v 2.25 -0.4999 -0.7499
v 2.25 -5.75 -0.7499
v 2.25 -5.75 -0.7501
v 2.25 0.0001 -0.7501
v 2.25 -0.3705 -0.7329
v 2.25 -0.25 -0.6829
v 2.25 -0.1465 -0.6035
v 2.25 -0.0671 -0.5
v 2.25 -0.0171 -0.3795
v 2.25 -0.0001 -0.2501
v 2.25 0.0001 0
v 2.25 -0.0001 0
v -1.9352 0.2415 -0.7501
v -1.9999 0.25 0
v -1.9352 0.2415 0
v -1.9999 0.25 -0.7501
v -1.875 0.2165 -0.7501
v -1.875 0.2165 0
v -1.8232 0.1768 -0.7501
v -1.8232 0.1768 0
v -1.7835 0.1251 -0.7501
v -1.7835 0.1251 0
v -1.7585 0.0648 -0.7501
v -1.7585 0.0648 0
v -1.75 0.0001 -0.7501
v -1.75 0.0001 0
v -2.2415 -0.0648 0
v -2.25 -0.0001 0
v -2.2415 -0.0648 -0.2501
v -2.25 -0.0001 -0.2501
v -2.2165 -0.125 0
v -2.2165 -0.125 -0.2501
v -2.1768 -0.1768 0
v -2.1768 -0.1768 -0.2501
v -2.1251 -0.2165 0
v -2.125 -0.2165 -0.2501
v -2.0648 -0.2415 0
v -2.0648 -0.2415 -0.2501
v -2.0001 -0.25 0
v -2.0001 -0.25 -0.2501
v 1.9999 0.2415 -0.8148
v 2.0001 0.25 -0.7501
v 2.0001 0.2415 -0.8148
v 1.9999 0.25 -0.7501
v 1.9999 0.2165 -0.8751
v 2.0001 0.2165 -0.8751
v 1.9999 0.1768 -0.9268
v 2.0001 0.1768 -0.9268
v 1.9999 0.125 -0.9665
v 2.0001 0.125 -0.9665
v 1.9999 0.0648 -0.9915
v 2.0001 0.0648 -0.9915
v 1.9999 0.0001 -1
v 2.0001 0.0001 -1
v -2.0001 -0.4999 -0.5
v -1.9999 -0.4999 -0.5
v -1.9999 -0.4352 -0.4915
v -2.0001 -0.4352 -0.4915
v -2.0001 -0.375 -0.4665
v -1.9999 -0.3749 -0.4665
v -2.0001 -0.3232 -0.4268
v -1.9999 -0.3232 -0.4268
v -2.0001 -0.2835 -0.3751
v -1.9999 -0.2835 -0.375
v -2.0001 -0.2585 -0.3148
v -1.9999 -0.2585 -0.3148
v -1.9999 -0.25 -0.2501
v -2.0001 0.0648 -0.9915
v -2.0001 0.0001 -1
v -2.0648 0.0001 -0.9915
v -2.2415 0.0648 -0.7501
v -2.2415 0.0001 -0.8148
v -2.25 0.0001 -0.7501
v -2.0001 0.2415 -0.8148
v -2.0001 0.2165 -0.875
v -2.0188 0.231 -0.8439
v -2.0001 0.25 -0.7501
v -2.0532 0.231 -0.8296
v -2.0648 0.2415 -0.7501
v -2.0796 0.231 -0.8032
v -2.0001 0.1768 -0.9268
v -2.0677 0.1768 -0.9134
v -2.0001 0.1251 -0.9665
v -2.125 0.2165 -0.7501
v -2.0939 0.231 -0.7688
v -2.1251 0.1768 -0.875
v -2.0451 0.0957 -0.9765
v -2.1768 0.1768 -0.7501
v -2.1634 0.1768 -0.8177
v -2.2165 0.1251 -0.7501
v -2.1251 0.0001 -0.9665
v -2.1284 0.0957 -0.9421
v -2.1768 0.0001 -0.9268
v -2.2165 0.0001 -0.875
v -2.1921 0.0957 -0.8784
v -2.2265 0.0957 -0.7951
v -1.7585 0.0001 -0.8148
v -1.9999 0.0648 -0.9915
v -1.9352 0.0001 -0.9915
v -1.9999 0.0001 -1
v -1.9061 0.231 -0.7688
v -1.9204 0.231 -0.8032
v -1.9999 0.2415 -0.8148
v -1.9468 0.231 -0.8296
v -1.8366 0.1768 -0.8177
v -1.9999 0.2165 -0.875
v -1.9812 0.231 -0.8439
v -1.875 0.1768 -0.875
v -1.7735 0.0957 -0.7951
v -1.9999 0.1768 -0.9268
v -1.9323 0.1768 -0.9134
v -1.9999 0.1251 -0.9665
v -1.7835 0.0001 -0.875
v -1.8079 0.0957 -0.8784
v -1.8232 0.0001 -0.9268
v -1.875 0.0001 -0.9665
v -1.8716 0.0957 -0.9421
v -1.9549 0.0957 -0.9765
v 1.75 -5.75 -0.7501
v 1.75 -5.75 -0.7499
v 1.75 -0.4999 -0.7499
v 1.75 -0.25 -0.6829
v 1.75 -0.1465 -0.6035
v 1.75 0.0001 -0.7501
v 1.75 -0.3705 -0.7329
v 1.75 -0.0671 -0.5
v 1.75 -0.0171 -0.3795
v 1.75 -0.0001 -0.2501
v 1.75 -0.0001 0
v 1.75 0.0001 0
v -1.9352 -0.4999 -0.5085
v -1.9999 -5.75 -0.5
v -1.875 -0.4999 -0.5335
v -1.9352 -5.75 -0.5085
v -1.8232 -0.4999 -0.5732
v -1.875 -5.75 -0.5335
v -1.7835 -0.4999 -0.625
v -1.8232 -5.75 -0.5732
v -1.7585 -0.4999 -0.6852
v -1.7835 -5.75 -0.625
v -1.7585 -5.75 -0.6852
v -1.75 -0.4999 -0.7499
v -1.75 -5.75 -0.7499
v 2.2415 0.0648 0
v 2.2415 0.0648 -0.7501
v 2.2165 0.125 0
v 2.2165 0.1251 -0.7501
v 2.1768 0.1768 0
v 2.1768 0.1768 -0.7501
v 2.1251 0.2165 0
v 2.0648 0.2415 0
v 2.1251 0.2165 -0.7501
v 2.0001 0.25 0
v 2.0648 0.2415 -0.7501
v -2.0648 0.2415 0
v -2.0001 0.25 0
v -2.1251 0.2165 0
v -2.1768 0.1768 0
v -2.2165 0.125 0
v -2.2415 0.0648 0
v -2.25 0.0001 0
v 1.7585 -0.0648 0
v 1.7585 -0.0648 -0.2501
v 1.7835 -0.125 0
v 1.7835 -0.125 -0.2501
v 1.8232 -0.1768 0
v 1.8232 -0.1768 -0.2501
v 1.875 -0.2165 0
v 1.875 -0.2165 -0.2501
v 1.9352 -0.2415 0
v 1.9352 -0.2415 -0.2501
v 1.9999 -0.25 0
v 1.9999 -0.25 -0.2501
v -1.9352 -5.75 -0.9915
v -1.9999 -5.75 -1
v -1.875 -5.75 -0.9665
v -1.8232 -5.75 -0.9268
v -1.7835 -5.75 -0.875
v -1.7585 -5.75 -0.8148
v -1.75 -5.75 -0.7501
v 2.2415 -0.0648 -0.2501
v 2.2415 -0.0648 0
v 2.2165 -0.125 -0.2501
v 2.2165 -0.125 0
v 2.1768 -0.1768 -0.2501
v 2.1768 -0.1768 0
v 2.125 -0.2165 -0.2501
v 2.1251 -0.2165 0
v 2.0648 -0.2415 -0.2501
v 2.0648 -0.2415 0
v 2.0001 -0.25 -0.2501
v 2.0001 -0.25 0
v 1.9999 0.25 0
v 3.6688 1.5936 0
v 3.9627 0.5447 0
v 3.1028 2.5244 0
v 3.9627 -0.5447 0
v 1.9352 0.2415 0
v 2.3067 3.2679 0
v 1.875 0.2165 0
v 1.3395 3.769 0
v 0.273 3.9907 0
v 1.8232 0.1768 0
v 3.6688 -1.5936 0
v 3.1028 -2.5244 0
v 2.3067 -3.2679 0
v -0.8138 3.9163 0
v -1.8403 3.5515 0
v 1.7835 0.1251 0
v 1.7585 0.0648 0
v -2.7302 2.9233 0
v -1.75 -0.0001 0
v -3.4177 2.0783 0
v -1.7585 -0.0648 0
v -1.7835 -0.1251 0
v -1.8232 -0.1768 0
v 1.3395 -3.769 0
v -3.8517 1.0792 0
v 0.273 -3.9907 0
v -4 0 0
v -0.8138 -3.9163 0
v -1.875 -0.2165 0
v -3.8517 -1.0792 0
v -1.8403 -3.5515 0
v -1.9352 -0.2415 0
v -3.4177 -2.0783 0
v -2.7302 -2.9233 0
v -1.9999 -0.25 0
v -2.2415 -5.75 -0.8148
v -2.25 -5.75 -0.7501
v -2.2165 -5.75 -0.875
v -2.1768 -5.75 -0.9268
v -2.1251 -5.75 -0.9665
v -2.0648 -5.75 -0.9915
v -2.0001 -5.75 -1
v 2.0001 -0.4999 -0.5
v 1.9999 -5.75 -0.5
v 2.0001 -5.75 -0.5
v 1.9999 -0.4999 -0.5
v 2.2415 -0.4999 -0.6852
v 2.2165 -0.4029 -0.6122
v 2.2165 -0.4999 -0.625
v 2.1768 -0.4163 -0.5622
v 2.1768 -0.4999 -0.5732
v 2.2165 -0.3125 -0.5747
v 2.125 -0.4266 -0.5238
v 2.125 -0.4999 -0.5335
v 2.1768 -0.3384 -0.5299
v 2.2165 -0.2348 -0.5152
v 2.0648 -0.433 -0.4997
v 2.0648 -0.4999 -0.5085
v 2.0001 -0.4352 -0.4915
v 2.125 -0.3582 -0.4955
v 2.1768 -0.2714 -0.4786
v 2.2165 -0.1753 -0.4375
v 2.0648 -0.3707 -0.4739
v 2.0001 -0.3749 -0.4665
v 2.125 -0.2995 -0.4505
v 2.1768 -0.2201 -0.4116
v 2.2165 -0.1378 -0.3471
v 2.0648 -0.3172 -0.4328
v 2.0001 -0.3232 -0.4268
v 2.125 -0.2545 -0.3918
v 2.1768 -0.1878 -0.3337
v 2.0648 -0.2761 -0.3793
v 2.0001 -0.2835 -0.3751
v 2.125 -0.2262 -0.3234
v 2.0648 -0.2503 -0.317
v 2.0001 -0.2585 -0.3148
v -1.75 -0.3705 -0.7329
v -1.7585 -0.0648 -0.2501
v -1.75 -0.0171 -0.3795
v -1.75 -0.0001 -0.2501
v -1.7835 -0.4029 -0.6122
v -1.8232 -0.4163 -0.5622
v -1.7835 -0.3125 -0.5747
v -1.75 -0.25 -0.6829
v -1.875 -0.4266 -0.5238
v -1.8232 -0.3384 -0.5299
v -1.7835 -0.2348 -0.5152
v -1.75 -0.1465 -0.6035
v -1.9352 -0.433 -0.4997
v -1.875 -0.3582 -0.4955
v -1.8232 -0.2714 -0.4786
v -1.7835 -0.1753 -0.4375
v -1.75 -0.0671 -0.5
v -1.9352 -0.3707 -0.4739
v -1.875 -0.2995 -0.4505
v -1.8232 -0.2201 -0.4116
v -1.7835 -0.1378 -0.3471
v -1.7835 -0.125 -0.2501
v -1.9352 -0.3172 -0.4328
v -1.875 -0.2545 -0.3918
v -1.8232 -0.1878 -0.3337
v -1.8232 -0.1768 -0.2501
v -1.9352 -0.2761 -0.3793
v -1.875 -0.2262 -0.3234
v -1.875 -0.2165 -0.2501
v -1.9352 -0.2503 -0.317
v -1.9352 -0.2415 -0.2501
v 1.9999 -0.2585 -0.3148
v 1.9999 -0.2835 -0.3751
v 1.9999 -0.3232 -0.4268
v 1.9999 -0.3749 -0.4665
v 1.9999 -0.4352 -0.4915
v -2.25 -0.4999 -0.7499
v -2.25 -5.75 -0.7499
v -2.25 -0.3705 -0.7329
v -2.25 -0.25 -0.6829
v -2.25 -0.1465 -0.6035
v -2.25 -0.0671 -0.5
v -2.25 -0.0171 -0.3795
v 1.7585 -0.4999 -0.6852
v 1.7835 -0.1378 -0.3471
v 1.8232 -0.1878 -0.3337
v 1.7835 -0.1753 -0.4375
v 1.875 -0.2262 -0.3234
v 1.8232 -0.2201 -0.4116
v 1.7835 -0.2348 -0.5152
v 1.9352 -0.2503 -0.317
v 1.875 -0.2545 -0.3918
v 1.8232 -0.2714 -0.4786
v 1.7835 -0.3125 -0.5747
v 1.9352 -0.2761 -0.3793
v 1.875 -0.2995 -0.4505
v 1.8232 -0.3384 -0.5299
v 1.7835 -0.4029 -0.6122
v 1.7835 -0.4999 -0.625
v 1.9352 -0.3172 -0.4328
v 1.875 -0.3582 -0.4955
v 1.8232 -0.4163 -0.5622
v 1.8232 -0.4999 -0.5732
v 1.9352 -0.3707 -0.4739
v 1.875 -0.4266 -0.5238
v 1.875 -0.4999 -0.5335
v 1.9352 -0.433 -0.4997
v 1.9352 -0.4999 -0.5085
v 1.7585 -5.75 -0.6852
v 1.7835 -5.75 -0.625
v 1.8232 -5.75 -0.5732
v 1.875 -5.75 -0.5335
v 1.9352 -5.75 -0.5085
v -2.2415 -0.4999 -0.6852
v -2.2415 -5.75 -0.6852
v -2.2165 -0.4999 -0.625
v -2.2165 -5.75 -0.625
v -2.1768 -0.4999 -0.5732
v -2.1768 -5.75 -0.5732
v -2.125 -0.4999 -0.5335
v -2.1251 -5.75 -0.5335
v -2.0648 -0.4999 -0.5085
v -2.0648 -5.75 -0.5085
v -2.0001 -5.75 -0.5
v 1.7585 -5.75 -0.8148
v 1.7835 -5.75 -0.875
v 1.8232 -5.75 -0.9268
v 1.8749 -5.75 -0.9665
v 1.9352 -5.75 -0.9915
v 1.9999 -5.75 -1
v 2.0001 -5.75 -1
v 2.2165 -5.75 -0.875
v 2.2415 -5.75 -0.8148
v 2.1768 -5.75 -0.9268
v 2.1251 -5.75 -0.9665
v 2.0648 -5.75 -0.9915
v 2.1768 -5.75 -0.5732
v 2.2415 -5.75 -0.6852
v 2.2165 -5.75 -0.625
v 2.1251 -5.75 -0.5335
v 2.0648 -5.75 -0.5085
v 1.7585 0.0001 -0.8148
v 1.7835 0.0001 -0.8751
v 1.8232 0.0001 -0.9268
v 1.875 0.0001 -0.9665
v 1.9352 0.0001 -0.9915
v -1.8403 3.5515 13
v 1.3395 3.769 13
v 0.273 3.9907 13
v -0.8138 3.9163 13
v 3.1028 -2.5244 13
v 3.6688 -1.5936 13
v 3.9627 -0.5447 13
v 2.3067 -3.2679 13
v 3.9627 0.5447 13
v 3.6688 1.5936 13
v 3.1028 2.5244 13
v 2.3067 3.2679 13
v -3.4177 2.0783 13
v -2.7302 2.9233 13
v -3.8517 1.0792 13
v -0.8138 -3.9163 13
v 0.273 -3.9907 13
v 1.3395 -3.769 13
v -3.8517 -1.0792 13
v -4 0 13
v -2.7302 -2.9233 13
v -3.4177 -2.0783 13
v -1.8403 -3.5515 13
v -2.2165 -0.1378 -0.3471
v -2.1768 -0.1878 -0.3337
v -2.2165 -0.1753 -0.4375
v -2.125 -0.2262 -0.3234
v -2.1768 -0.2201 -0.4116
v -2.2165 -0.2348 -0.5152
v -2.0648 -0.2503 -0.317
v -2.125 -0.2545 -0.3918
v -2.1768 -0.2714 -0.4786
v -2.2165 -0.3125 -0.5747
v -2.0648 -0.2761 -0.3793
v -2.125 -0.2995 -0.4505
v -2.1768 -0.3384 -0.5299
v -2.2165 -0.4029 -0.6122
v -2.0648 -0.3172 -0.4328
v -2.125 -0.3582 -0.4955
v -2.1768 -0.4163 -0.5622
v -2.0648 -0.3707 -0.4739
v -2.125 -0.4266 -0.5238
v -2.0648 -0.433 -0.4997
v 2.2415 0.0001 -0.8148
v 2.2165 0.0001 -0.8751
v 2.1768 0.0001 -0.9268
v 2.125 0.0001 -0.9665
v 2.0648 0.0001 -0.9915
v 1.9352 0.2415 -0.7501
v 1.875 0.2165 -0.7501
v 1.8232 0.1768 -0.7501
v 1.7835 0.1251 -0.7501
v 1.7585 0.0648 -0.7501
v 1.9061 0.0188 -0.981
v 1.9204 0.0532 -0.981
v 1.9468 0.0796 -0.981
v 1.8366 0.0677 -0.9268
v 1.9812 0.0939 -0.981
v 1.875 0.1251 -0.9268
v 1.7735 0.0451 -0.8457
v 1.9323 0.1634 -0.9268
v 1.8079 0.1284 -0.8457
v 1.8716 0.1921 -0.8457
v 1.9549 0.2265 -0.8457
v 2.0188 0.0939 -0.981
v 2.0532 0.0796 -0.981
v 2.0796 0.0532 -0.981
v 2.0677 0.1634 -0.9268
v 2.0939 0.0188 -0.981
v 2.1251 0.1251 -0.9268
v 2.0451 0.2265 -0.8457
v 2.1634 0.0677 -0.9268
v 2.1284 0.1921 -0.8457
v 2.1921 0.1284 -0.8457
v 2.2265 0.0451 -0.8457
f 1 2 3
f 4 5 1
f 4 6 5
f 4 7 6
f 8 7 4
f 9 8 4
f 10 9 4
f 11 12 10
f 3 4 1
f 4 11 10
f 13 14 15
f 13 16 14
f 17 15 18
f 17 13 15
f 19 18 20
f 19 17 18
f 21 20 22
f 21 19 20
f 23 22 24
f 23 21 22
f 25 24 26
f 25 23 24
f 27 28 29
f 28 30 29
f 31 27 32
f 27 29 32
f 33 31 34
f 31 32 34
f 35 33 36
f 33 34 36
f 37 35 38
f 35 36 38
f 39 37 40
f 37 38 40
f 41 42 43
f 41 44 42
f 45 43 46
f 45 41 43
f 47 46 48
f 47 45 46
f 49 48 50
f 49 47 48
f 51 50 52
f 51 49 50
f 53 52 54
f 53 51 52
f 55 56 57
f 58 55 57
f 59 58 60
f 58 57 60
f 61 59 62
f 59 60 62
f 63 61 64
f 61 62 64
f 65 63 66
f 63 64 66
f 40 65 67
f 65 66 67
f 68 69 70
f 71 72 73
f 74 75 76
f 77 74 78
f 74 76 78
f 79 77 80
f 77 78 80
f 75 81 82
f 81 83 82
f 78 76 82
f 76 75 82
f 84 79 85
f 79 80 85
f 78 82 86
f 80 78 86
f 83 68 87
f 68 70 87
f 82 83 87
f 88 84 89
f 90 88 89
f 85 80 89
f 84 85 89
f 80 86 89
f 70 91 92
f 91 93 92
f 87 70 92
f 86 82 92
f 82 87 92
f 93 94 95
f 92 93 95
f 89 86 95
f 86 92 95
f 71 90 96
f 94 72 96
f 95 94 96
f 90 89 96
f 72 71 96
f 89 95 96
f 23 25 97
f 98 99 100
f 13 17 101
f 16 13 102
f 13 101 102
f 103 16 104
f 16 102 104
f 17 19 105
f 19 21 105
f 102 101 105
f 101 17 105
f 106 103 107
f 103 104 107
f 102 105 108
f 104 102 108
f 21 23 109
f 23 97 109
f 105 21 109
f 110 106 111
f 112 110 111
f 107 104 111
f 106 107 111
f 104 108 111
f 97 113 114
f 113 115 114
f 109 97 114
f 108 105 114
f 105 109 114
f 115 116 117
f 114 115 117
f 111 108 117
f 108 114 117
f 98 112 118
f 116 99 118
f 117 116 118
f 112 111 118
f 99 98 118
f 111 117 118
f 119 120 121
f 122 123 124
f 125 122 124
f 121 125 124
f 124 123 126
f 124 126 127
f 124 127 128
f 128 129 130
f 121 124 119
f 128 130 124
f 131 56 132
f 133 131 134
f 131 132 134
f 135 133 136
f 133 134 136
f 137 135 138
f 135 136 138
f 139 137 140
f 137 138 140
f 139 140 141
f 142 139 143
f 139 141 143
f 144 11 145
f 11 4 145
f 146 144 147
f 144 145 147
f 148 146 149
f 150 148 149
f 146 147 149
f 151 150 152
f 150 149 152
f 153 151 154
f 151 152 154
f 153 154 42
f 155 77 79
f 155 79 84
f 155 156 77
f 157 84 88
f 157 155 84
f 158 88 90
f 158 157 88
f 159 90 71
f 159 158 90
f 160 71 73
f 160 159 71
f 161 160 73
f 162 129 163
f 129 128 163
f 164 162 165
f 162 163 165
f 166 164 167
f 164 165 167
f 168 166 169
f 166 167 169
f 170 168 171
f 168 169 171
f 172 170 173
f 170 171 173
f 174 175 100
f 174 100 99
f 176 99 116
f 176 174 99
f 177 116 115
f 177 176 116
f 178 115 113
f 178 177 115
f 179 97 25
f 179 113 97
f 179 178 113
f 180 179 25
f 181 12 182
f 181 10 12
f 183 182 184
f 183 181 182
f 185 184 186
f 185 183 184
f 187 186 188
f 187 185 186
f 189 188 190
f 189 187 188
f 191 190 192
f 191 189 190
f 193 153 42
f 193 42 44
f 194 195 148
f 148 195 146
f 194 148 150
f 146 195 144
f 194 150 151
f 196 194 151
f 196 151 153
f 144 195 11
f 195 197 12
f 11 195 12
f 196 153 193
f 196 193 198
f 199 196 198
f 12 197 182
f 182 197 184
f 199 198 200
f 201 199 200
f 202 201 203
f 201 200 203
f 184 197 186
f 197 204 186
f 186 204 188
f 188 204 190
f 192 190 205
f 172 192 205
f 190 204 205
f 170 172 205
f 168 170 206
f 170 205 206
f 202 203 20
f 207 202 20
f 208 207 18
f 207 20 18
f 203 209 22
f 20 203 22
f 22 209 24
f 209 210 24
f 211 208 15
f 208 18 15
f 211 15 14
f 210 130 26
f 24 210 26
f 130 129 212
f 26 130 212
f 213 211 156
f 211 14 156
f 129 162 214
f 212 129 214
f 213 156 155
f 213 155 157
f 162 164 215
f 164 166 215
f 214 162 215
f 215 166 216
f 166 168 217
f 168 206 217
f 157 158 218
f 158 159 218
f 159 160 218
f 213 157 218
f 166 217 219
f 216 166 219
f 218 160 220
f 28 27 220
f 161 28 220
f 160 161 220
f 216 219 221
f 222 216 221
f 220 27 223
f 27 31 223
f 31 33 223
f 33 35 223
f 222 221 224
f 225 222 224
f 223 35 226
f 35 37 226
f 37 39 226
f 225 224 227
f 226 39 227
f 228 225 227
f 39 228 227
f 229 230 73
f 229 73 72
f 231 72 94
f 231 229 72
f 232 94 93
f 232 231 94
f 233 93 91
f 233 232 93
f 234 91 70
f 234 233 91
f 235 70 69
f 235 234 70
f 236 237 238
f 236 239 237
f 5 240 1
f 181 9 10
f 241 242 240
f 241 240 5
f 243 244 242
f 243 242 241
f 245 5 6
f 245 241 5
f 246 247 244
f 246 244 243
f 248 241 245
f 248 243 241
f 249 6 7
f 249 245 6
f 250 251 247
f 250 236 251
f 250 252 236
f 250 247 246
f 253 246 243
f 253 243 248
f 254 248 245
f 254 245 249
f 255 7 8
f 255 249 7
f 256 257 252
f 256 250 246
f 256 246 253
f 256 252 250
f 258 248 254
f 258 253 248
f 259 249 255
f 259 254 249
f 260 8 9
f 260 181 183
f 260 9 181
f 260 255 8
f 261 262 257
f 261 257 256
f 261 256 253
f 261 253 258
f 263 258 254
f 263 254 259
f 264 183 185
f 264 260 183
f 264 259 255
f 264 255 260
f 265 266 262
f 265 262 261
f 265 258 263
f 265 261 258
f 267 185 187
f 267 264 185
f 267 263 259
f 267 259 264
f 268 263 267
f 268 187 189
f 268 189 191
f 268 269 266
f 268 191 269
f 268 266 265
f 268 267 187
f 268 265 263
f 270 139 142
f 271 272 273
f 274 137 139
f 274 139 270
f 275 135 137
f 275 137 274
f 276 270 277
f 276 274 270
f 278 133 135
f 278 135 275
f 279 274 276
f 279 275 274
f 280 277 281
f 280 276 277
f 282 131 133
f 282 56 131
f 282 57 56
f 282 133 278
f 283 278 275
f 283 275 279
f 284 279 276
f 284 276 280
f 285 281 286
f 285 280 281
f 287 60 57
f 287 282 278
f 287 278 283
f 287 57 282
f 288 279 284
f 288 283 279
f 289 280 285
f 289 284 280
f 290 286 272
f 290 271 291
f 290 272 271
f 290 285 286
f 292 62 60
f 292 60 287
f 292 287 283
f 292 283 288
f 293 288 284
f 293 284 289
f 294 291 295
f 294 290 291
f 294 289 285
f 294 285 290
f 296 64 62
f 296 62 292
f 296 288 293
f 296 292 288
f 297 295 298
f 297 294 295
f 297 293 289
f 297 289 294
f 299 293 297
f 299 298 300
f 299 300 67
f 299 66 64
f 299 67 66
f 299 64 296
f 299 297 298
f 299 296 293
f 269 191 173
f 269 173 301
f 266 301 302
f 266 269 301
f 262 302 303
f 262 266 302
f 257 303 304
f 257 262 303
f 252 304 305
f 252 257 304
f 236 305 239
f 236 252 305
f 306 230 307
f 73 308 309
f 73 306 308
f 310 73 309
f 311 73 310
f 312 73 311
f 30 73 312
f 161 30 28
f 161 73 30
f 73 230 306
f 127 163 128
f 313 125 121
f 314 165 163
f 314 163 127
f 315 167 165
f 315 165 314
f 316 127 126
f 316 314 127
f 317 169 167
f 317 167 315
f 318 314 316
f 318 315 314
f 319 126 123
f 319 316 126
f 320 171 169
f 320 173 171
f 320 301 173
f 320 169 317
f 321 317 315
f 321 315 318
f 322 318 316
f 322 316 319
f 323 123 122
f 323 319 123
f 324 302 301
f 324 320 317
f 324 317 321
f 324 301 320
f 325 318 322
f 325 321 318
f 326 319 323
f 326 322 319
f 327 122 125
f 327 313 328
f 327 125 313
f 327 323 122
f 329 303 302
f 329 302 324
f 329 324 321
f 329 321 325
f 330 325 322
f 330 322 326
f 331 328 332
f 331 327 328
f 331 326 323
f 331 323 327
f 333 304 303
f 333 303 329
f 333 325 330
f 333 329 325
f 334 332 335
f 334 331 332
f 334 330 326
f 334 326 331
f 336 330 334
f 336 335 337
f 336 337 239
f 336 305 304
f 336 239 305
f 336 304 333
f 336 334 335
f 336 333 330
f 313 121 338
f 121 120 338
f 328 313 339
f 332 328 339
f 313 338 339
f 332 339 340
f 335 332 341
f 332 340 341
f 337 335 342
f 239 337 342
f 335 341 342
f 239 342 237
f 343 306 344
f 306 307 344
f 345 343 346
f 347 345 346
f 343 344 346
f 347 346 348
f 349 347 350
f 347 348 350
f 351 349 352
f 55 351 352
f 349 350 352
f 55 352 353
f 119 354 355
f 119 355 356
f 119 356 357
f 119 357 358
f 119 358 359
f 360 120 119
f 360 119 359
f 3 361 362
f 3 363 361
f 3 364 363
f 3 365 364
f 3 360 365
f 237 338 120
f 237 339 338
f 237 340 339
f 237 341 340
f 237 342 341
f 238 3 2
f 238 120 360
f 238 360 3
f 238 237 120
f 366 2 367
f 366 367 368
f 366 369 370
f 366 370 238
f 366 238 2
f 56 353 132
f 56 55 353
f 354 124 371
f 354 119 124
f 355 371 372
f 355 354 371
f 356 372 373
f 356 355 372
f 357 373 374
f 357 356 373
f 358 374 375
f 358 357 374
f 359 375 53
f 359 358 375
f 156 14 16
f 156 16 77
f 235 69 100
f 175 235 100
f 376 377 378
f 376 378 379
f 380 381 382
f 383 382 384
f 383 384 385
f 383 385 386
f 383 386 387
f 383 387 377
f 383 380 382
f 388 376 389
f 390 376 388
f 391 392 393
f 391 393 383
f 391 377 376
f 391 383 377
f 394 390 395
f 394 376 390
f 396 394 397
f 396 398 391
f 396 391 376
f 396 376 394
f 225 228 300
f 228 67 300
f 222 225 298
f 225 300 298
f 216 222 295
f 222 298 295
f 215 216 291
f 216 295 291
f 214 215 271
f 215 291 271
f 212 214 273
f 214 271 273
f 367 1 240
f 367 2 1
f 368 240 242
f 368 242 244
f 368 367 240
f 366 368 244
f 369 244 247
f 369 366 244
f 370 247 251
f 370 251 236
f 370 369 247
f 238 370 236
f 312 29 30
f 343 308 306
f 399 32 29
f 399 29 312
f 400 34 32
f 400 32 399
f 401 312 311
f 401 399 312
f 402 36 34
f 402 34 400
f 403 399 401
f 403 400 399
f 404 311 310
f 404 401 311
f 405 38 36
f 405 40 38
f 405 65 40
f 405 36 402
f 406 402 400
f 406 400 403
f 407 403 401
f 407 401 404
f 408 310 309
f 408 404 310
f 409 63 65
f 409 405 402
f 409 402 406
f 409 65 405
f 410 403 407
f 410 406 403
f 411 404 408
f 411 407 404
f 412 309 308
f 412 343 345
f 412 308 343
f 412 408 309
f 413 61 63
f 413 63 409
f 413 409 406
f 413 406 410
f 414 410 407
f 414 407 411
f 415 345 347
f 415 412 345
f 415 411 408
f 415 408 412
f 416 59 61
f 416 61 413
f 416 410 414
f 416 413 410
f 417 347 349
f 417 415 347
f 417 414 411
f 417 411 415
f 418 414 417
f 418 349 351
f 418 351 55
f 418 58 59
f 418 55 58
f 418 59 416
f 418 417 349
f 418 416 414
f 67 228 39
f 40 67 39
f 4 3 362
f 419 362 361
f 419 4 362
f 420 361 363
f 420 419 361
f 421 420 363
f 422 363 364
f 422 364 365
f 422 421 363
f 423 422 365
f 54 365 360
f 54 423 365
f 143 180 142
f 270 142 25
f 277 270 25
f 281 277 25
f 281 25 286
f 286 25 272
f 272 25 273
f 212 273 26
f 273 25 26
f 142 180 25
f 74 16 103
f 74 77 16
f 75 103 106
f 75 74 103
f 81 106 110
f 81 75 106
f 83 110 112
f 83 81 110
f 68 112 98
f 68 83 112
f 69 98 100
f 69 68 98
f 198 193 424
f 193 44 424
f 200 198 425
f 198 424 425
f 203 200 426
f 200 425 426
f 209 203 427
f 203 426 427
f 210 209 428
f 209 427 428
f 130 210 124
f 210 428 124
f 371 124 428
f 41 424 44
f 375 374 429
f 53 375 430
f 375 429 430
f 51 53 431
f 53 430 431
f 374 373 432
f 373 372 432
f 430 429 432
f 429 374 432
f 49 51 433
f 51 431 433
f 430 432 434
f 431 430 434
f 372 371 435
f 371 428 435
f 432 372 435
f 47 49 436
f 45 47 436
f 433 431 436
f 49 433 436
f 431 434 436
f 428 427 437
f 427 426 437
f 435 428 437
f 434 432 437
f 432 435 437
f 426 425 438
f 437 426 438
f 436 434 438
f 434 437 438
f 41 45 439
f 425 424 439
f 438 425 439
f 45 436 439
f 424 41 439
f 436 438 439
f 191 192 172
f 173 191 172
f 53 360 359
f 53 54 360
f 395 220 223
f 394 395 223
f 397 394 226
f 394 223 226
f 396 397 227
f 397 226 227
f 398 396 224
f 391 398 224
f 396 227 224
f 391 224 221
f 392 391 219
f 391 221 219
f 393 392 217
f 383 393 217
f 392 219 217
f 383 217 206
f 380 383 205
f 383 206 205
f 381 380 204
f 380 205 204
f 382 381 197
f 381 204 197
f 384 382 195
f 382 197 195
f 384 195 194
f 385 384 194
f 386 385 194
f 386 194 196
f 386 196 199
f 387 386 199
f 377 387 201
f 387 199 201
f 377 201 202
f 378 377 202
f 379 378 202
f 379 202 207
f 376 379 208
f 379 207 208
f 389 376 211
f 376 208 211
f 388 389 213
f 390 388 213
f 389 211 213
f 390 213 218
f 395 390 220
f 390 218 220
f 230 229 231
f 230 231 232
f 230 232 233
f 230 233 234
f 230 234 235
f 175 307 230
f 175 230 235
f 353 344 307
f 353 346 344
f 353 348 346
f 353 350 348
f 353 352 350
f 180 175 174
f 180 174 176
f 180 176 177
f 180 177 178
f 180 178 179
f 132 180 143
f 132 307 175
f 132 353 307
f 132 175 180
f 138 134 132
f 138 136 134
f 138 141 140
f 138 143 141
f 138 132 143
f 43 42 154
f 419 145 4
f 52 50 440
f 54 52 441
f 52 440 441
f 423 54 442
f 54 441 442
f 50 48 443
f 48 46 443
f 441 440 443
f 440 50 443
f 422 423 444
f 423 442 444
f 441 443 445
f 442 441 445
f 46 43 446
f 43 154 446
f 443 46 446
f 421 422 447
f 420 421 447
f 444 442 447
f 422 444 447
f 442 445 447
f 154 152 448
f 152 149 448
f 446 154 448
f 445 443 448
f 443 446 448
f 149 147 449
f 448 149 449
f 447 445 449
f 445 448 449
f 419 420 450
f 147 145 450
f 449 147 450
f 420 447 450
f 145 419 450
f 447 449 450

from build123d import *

# Parameters (mm, degrees)
SKETCH_1_R      = 4
EXTRUDE_1_DEPTH = 13
SKETCH_2_W      = 0.5
SKETCH_2_H      = 0.5
EXTRUDE_2_DEPTH = 1
SKETCH_3_W      = 0.5
SKETCH_3_H      = 0.5
EXTRUDE_3_DEPTH = 5.5
FILLET_1_R      = 0.25
FILLET_2_R      = 0.25


with BuildPart() as part:
    # Эскиз1 → Бобышка-Вытянуть1 (new body)
    with BuildSketch(Plane.XY):
        with Locations(Location((0, 0, 0), (0, 0, 180))):
            Circle(SKETCH_1_R)
    extrude(amount=EXTRUDE_1_DEPTH)

    # Эскиз2 → Бобышка-Вытянуть2 (add)
    with BuildSketch(Plane(origin=(0, 0, 0), x_dir=(-1, 0, 0), z_dir=(0, 0, -1))):
        with Locations((2, 0)):
            Rectangle(SKETCH_2_W, SKETCH_2_H)
        with Locations((-2, 0)):
            Rectangle(SKETCH_2_W, SKETCH_2_H)
    extrude(amount=EXTRUDE_2_DEPTH)

    # Эскиз3 → Бобышка-Вытянуть3 (add)
    with BuildSketch(Plane.XZ.offset(0.25)):
        with Locations((-2, -0.75)):
            Rectangle(SKETCH_3_W, SKETCH_3_H)
        with Locations((2, -0.75)):
            Rectangle(SKETCH_3_W, SKETCH_3_H)
    extrude(amount=EXTRUDE_3_DEPTH)

    # Скругление1
    fillet_1_edges = [part.edges().sort_by_distance(p)[0] for p in [
        (-1.75, -2.75, -1),
        (-2.25, -2.75, -1),
    ]]
    fillet(fillet_1_edges, radius=FILLET_1_R - 0.0001)  # a hair under: the kernel refuses the full size

    # Скругление2
    fillet_2_edges = [part.edges().sort_by_distance(p)[0] for p in [
        (-1.75, -0.25, -0.25),
        (-2.25, -0.25, -0.25),
        (-2.25, -3, -0.5),
        (-2, -0.25, -0.5),
        (-1.75, -3, -0.5),
        (1.75, -0.25, -0.25),
        (2.25, -0.25, -0.25),
        (1.75, -3, -0.5),
        (2, -0.25, -0.5),
        (2.25, -3, -0.5),
        (-1.75, 0.25, -0.37505),
        (-2.25, 0.25, -0.37505),
        (-2.176805985, 0.25, -0.926805985),
        (-1.823194015, 0.25, -0.926805985),
        (1.75, 0.25, -0.5),
        (2.25, 0.25, -0.5),
        (1.75, -2.75, -1),
        (2, 0.25, -1),
        (2.25, -2.75, -1),
    ]]
    fillet(fillet_2_edges, radius=FILLET_2_R - 0.0001)  # a hair under: the kernel refuses the full size


solid = part.part
